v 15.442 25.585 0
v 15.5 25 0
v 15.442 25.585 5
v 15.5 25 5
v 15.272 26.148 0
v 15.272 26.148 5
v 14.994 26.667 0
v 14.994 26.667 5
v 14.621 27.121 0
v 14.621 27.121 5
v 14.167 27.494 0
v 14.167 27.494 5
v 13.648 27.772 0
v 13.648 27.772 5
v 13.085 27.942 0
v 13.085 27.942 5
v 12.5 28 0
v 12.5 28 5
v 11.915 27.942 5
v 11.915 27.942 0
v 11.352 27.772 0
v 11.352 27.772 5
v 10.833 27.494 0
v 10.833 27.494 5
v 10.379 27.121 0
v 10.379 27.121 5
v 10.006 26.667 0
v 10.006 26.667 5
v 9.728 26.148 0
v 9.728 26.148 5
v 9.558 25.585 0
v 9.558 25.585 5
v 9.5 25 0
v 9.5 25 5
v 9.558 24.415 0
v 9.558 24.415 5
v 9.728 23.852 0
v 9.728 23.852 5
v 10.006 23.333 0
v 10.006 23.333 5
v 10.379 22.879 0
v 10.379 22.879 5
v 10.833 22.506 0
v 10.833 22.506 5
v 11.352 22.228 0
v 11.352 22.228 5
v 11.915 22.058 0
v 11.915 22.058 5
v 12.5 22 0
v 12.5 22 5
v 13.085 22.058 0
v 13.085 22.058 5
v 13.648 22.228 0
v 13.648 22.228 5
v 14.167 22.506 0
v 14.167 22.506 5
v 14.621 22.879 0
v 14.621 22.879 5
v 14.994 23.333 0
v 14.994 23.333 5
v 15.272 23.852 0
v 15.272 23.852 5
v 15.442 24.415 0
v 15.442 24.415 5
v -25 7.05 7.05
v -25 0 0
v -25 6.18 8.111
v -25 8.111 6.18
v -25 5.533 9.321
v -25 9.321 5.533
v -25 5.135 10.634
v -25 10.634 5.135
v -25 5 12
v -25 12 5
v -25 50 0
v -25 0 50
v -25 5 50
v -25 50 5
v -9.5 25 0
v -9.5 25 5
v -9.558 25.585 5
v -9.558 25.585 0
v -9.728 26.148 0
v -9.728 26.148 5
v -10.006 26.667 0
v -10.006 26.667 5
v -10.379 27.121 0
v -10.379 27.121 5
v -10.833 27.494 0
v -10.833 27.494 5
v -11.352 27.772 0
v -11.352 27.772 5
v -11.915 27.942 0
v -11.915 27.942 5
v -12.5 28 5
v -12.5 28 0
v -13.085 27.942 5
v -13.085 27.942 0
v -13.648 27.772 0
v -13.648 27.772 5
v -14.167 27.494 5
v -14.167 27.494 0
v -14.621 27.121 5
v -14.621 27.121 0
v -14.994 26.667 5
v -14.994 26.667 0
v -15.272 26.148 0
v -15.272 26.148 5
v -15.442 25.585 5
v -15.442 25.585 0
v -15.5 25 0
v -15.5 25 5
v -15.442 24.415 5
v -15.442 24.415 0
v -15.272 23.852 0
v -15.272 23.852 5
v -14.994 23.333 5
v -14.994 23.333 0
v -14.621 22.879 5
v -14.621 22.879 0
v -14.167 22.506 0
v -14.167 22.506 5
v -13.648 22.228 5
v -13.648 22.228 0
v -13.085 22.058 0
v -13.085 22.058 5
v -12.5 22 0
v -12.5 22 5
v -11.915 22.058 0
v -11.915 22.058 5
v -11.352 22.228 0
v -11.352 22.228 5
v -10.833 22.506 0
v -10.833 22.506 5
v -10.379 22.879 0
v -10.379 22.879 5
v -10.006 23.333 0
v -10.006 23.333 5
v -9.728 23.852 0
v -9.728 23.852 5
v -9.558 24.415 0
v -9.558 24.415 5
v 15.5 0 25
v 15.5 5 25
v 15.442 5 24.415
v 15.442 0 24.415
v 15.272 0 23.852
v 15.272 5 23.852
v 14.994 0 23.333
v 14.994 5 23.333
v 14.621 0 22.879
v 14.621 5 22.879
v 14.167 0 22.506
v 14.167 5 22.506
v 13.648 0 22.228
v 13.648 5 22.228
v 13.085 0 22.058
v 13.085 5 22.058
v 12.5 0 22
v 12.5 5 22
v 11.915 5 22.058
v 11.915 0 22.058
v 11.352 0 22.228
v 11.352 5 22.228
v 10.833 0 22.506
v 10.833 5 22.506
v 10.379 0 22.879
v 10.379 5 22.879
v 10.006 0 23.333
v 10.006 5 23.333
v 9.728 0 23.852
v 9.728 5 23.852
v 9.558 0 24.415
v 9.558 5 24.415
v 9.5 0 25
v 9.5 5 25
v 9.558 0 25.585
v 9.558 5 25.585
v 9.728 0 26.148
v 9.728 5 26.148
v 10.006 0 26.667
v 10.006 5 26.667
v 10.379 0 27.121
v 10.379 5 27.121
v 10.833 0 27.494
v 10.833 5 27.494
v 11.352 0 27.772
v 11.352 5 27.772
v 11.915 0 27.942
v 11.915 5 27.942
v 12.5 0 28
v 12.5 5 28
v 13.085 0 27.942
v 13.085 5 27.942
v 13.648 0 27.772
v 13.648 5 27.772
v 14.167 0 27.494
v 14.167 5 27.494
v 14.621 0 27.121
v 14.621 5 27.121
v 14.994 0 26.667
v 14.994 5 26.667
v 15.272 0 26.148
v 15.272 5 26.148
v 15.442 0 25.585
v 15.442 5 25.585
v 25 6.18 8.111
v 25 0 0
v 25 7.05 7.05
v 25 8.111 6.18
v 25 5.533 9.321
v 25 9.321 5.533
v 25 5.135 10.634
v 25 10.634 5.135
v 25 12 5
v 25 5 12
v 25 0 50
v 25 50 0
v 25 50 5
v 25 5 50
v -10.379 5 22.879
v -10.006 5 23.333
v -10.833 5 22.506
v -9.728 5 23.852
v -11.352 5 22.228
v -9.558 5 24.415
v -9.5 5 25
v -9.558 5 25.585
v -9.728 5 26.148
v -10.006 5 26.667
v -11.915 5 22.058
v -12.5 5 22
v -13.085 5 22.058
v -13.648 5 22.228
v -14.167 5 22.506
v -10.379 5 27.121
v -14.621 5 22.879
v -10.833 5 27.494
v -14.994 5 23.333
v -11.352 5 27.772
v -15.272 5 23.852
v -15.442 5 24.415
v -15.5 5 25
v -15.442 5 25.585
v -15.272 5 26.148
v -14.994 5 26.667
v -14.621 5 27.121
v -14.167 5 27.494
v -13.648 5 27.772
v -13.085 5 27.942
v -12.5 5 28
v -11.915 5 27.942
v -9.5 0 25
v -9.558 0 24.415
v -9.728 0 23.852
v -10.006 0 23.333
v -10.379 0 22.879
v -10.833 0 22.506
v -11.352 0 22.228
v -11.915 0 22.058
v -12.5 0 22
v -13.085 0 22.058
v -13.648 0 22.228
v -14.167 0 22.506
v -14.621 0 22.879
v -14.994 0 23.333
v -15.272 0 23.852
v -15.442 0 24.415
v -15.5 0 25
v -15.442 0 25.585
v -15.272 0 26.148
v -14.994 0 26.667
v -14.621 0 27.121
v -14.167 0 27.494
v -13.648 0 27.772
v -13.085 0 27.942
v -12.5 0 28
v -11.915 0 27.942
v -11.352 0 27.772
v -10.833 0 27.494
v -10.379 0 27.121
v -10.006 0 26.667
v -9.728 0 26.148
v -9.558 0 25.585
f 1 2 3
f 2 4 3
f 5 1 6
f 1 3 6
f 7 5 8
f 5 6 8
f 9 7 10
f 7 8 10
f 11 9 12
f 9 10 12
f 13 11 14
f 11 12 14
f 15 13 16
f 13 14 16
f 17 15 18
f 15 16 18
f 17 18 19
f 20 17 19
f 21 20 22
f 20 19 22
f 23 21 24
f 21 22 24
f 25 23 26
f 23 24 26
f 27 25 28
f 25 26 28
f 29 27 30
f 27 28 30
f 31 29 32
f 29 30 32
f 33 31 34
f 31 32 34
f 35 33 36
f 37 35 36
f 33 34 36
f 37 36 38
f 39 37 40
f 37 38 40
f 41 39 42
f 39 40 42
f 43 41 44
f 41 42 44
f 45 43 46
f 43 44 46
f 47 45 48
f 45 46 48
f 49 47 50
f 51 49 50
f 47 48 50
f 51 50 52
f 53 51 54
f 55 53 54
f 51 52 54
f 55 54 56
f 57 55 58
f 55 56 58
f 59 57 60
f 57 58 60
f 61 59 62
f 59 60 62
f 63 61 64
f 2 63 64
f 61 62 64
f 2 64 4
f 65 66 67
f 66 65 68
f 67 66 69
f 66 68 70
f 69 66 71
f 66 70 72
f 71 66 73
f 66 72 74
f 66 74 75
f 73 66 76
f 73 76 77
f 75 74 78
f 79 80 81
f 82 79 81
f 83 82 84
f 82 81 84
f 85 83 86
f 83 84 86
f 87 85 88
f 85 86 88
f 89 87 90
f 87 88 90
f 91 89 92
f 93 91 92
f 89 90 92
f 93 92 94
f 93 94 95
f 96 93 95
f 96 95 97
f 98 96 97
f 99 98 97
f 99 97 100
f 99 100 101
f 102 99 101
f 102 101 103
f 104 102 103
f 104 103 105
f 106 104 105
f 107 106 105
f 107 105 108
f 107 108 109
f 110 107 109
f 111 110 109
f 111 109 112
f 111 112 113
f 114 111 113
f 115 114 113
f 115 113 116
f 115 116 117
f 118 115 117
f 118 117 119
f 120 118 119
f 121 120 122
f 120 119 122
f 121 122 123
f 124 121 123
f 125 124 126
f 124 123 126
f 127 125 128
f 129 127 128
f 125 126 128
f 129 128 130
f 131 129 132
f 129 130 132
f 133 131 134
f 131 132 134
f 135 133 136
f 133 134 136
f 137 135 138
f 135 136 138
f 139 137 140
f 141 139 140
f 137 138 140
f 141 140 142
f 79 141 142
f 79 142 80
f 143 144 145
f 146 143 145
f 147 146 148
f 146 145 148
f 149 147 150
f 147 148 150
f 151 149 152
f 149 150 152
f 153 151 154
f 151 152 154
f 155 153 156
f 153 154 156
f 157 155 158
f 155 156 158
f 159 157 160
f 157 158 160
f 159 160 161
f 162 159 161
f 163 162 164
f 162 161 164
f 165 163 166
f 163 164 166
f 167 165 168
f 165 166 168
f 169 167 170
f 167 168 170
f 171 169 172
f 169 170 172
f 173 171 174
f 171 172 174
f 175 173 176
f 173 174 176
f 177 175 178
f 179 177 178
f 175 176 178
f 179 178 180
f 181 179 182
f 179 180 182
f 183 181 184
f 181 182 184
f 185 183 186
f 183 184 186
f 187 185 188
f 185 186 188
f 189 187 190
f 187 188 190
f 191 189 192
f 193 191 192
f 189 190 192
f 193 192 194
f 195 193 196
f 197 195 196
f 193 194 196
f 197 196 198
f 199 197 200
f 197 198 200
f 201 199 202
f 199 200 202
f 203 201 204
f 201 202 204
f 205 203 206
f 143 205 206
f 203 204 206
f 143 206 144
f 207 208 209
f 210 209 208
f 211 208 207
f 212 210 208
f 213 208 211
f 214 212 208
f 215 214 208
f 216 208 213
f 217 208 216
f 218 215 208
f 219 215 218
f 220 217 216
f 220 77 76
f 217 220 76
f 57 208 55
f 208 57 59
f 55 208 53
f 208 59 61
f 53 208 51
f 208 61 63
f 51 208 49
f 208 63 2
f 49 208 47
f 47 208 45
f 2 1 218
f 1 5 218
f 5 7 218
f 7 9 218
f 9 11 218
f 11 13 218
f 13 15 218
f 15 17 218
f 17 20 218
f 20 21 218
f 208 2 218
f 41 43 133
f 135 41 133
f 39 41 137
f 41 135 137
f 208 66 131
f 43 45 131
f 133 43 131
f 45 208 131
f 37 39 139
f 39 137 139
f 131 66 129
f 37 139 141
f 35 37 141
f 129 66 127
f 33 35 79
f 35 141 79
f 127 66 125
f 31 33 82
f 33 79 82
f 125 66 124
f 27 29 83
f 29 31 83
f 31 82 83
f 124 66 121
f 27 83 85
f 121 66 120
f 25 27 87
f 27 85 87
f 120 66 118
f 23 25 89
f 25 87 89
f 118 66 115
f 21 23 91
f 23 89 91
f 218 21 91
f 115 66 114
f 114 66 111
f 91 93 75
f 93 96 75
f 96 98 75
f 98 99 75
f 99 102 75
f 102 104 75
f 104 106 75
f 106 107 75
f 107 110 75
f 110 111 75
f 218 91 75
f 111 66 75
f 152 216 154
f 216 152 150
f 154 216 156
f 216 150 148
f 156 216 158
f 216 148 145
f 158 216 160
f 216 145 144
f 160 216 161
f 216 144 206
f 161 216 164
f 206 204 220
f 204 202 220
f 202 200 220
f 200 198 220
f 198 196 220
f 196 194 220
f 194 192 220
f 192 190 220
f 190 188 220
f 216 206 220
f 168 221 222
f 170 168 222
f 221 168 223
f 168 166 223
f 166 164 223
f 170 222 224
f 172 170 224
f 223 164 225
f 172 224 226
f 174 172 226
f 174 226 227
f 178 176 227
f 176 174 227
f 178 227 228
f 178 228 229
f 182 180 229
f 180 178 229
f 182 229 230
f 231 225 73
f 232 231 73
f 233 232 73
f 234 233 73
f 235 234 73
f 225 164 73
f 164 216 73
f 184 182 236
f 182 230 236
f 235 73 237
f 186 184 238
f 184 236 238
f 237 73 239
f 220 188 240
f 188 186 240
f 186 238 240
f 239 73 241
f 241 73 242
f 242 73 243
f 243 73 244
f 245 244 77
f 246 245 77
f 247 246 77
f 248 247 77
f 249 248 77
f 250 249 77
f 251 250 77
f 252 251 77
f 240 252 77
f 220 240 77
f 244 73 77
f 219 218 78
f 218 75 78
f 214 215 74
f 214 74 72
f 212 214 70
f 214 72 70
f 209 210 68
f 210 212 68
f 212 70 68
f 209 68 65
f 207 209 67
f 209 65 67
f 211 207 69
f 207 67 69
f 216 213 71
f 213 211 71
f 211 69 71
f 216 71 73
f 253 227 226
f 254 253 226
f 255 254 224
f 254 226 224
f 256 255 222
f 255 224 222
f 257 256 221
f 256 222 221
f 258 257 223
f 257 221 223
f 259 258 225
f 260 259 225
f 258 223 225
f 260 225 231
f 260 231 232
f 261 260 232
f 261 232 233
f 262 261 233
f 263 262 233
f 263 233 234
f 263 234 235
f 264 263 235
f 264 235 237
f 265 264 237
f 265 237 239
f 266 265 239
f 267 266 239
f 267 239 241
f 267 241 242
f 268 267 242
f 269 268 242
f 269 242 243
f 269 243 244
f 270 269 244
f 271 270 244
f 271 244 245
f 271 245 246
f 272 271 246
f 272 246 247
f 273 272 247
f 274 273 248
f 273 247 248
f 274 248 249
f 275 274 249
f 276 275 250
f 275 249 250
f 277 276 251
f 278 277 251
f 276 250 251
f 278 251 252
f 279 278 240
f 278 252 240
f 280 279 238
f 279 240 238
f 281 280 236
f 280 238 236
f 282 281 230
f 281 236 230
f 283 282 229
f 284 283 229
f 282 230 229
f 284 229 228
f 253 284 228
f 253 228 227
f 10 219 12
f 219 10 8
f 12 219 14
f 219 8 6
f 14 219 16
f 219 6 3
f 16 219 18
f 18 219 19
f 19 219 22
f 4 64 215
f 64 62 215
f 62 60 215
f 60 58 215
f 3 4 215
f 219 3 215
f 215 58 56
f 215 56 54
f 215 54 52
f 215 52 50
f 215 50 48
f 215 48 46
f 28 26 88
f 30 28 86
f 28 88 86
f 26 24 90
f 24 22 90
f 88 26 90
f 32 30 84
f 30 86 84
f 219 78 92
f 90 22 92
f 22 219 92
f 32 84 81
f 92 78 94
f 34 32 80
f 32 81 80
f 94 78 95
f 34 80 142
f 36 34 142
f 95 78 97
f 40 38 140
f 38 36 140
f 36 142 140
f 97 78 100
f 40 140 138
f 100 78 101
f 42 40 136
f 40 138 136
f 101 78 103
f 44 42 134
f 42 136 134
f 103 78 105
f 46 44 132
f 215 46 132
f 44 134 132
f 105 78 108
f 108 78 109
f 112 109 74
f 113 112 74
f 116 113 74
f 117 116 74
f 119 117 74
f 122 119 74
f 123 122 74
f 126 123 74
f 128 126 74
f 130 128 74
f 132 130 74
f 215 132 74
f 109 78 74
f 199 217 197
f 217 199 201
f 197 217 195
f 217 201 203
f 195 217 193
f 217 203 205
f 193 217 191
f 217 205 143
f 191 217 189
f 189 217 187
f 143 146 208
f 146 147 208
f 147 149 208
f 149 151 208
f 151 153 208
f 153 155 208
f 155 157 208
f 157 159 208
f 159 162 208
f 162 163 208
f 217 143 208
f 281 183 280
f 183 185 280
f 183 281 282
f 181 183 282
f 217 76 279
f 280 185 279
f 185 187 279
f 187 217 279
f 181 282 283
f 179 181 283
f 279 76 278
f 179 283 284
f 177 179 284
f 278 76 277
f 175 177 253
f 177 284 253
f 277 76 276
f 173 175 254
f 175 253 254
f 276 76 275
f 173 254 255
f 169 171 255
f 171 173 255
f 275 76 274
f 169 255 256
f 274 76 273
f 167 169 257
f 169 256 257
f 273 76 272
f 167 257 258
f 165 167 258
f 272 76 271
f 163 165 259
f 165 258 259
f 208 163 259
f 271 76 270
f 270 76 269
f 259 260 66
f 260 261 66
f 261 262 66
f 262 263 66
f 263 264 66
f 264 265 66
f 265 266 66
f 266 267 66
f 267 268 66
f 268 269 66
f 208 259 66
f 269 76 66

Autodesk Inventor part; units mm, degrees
ref_plane "YZ Plane" through (0, 0, 0) normal (1, 0, 0) x (0, 1, 0)
ref_plane "XZ Plane" through (0, 0, 0) normal (0, 1, 0) x (-1, 0, 0)
ref_plane "XY Plane" through (0, 0, 0) normal (0, 0, 1) x (1, 0, 0)
sketch "Sketch1" plane through (0, 0, 0) normal (1, 0, 0) x (0, 1, 0)
  line L0 (0, 0) -> (5, 0)
  line L1 (5, 0) -> (5, 50)
  line L2 (5, 50) -> (0, 50)
  line L3 (0, 50) -> (0, 0)
  line L4 (0, 0) -> (50, 0)
  line L5 (50, 0) -> (50, 5)
  line L6 (50, 5) -> (0, 5)
  line L7 (0, 5) -> (0, 0)
  point P0 (5, 5)
  dimension "d0" = 5
  dimension "d1" = 50
  dimension "d2" = 50
  dimension "d3" = 5
extrude "Extrusion1" add sketch "Sketch1" along normal mid plane 50
fillet "Fillet1" radius 7 1 edges at (0, 5, 5)
sketch "Sketch2" plane through (-25, 50, 5) normal (0, 0, 1) x (1, 0, 0)
  line L0 (0, 0) -> (0, -50) projected
  line L1 (0, 0) -> (0, -25)
  line L2 (12.5, -25) -> (37.5, -25)
  circle A0 centre (12.5, -25) radius 3
  circle A1 centre (37.5, -25) radius 3
  point P0 (25, -50)
  dimension "d7" = 25
  dimension "d8" = 6
  dimension "d9" = 6
sketch "Sketch3" plane through (-25, 5, 50) normal (0, 1, 0) x (1, 0, 0)
  line L0 (0, 50) -> (0, 0) projected
  line L1 (0, 0) -> (0, 25)
  line L2 (12.5, 25) -> (37.5, 25)
  circle A0 centre (12.5, 25) radius 3
  circle A1 centre (37.5, 25) radius 3
  point P0 (25, 50)
  dimension "d10" = 25
  dimension "d11" = 6
  dimension "d12" = 6
extrude "Extrusion2" cut sketch "Sketch2" against normal blind 50
extrude "Extrusion3" cut sketch "Sketch3" against normal blind 50
properties part number "lclamp"
